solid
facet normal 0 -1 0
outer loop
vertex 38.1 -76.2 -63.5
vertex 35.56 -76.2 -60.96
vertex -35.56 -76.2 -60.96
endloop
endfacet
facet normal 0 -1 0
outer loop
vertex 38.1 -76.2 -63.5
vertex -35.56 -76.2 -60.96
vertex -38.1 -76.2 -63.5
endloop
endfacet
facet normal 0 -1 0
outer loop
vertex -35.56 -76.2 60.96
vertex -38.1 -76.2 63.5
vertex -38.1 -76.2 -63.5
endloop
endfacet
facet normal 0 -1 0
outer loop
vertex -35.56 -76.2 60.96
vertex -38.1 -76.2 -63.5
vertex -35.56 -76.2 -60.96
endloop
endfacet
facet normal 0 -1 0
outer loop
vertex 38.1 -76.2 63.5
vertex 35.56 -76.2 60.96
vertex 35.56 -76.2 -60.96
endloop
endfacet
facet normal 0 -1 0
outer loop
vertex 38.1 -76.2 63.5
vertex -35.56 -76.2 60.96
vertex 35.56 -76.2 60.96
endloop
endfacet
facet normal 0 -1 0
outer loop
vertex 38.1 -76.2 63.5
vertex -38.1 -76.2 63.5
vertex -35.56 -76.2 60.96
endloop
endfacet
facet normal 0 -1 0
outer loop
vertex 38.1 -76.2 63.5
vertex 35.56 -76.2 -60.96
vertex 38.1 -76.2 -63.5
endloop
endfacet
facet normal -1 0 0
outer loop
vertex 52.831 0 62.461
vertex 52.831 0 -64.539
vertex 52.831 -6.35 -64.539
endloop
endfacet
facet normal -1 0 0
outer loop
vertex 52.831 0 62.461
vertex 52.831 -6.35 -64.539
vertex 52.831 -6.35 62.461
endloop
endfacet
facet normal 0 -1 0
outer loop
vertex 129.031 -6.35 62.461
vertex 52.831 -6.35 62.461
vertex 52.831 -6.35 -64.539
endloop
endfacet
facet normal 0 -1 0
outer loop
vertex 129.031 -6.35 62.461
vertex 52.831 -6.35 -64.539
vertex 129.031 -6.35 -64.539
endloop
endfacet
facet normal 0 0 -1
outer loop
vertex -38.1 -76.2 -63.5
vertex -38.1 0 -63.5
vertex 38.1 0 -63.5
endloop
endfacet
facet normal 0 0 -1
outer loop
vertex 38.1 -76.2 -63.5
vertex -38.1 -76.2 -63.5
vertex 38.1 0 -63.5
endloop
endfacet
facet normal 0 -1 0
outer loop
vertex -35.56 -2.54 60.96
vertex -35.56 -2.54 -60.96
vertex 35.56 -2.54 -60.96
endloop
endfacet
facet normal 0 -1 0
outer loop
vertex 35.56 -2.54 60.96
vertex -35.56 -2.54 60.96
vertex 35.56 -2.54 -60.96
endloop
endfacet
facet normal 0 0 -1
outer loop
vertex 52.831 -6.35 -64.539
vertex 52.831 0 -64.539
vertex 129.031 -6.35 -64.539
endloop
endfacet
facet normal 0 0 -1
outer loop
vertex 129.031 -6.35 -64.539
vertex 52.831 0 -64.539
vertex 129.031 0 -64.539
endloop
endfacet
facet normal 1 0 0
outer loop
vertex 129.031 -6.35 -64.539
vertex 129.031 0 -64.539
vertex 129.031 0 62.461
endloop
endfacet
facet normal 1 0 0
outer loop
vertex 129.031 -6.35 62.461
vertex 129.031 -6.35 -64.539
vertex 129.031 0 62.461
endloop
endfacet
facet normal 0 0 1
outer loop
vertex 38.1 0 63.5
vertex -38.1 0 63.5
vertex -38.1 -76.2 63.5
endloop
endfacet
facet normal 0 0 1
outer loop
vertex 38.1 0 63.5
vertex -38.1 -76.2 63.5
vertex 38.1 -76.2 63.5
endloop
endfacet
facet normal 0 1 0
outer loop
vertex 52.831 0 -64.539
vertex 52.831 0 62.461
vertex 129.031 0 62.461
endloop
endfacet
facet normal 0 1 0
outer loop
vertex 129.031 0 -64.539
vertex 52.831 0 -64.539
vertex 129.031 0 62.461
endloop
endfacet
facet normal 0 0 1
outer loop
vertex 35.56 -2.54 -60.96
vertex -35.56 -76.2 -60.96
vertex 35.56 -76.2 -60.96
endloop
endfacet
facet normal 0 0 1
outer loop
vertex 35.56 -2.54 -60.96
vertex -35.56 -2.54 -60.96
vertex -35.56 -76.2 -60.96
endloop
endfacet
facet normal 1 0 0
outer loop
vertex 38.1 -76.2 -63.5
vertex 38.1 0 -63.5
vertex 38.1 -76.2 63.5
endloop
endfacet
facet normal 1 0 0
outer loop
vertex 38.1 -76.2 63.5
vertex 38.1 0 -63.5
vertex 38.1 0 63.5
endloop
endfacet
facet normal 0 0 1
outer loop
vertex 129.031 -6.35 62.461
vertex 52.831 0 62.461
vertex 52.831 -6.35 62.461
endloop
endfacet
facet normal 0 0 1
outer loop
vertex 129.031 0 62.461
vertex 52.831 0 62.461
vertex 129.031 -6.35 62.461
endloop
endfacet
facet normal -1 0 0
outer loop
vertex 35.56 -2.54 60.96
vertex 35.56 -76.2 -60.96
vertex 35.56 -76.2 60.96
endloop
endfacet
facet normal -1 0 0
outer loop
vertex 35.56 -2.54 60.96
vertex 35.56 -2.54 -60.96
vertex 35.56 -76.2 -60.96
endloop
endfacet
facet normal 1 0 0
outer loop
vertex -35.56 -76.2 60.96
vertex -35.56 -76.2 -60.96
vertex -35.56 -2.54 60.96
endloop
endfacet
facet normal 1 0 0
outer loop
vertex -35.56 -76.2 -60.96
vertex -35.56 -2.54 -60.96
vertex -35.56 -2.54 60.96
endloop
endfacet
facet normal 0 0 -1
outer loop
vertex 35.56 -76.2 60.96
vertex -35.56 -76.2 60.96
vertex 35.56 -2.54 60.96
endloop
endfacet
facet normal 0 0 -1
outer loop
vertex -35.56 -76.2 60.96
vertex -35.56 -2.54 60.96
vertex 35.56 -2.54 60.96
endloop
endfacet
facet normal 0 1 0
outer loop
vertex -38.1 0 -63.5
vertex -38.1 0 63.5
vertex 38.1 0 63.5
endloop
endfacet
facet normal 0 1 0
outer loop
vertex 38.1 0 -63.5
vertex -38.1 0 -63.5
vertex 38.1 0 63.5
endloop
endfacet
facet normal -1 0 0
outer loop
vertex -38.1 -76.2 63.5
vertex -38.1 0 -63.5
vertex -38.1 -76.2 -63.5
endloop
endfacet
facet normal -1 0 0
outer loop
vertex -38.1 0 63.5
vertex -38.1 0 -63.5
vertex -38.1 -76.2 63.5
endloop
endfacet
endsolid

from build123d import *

# Parameters (mm, degrees)
F0_W     = 76.2
F0_H     = 127
F1_DEPTH = 76.2
F2_DEPTH = 6.35
F3_T     = -2.54


with BuildPart() as f1:
    # F0 (on Front) → F1 (new body)
    with BuildSketch(Plane.XZ):
        Rectangle(F0_W, F0_H)
    extrude(amount=F1_DEPTH)

    # F3
    f3_openings = [f1.faces().sort_by_distance(p)[0] for p in [
        (0, -76.2, 0),
    ]]
    offset(amount=F3_T, openings=f3_openings)


with BuildPart() as f2:
    # F0 (on Front) → F2 (new body)
    with BuildSketch(Plane.XZ):
        with Locations((90.930946, -1.039433)):
            Rectangle(F0_W, F0_H)
    extrude(amount=F2_DEPTH)


solid = Compound([f1.part, f2.part])
